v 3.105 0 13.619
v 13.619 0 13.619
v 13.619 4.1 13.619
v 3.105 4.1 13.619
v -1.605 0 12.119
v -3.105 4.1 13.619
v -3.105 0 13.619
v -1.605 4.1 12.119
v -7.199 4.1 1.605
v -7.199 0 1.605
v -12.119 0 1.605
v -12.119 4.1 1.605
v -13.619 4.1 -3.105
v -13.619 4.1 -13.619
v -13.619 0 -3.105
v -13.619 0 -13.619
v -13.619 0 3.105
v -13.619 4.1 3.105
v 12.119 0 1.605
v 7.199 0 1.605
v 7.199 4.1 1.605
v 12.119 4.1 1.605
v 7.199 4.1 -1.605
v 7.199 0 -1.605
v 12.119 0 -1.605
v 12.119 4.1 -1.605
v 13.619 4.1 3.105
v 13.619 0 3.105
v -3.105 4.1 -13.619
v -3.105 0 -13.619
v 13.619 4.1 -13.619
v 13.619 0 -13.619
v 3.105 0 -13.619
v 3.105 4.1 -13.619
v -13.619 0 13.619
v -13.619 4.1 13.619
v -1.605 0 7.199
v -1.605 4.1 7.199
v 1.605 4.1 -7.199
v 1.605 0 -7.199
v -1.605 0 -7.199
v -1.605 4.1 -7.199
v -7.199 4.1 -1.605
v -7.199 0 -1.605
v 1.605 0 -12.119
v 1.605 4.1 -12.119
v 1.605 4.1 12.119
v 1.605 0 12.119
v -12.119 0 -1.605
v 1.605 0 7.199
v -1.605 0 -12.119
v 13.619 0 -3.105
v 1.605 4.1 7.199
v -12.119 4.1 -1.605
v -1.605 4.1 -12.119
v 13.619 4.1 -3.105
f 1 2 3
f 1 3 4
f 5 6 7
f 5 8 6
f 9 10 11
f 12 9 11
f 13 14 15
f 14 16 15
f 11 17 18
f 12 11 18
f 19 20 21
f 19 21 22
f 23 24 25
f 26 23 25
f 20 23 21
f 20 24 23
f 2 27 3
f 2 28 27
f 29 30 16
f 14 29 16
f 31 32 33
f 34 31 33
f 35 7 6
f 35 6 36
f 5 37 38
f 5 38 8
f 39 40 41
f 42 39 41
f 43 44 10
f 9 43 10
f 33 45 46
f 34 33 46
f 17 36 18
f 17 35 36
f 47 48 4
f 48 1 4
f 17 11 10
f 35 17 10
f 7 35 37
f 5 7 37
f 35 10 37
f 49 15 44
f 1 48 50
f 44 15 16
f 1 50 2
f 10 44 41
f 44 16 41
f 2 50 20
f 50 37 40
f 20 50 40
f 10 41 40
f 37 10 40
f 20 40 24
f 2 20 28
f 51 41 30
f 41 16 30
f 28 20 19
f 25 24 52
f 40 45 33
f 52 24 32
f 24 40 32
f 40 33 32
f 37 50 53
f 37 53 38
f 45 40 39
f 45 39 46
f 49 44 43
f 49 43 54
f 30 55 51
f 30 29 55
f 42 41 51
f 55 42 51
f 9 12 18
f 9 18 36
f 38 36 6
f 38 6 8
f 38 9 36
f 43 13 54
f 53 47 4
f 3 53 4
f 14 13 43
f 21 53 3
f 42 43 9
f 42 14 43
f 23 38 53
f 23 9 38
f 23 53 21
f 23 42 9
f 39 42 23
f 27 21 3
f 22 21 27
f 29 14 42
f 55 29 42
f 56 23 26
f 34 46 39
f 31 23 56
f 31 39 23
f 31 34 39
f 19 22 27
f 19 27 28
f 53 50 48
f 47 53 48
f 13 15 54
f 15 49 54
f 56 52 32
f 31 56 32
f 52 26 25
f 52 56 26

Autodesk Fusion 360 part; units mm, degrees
sketch "Sketch1" plane through (0, 0, 0) normal (0, 1, 0) x (1, 0, 0)
  line L0 (13.6189, 1.605) -> (13.6189, 13.6189)
  line L1 (-13.6189, 13.6189) -> (-13.6189, 1.605)
  line L2 (13.6189, -1.605) -> (13.6189, -13.6189)
  line L3 (-13.6189, -13.6189) -> (-13.6189, -1.605)
  line L4 (1.605, 7.1989) -> (1.605, 13.6189)
  line L5 (0, 0) -> (2.5, 0)
  line L6 (7.1989, 1.605) -> (13.6189, 1.605)
  line L7 (7.1989, -1.605) -> (13.6189, -1.605)
  line L8 (13.6189, 13.6189) -> (1.605, 13.6189)
  line L9 (-1.605, 13.6189) -> (-13.6189, 13.6189)
  line L10 (-13.6189, 13.6189) -> (0, 0)
  line L11 (0, 0) -> (13.6189, 13.6189)
  line L12 (-13.6189, -13.6189) -> (0, 0)
  line L13 (0, 0) -> (13.6189, -13.6189)
  line L14 (7.1989, 1.605) -> (7.1989, -1.605)
  line L15 (-7.1989, -1.605) -> (-13.6189, -1.605)
  line L16 (-7.1989, 1.605) -> (-7.1989, -1.605)
  line L17 (-7.1989, 1.605) -> (-13.6189, 1.605)
  line L18 (-1.605, 7.1989) -> (-1.605, 13.6189)
  line L19 (1.605, 7.1989) -> (-1.605, 7.1989)
  line L20 (-1.605, -7.1989) -> (-1.605, -13.6189)
  line L21 (1.605, -7.1989) -> (1.605, -13.6189)
  line L22 (1.605, -7.1989) -> (-1.605, -7.1989)
  line L23 (13.6189, -13.6189) -> (1.605, -13.6189)
  line L24 (-1.605, -13.6189) -> (-13.6189, -13.6189)
  line L25 (81.6508, 319732.5239) -> (6.33, 319732.5239)
  line L26 (81.6508, 319732.5239) -> (102.864, 319753.7371)
  line L27 (92.864, 319735.0239) -> (102.864, 319735.0239)
  line L28 (102.864, 319753.7371) -> (84.1508, 319753.7371)
  line L29 (92.864, 319730.0239) -> (102.864, 319730.0239)
  line L30 (102.864, 319735.0239) -> (102.864, 319753.7371)
  line L31 (60.4376, 319753.7371) -> (60.4376, 319735.0239)
  line L32 (60.4376, 319711.3107) -> (60.4376, 319730.0239)
  line L33 (84.1508, 319743.7371) -> (84.1508, 319753.7371)
  line L34 (60.4376, 319711.3107) -> (81.6508, 319732.5239)
  line L35 (102.864, 319730.0239) -> (102.864, 319711.3107)
  line L36 (60.4376, 319753.7371) -> (81.6508, 319732.5239)
  line L37 (84.1508, 319721.3107) -> (79.1508, 319721.3107)
  line L38 (84.1508, 319721.3107) -> (84.1508, 319711.3107)
  line L39 (79.1508, 319721.3107) -> (79.1508, 319711.3107)
  line L40 (84.1508, 319743.7371) -> (79.1508, 319743.7371)
  line L41 (79.1508, 319743.7371) -> (79.1508, 319753.7371)
  line L42 (92.864, 319735.0239) -> (92.864, 319730.0239)
  line L43 (81.6508, 319732.5239) -> (102.864, 319711.3107)
  line L44 (79.1508, 319753.7371) -> (60.4376, 319753.7371)
  line L45 (79.1508, 319711.3107) -> (60.4376, 319711.3107)
  line L46 (70.4376, 319730.0239) -> (60.4376, 319730.0239)
  line L47 (70.4376, 319735.0239) -> (70.4376, 319730.0239)
  line L48 (70.4376, 319735.0239) -> (60.4376, 319735.0239)
  line L49 (102.864, 319711.3107) -> (84.1508, 319711.3107)
  dimension "d9" = 19.26
  dimension "d15" = 6.42
  dimension "d60" = 30
  dimension "d61" = 10
  dimension "d62" = 5
  dimension "d69" = 3.21
extrude "Extrude1" add sketch "Sketch1" along normal blind 4.1 contours L0 L2 L6 L7 L11 L13 L14 | L4 L8 L9 L10 L11 L18 L19 | L1 L3 L10 L12 L15 L16 L17 | L12 L13 L20 L21 L22 L23 L24
chamfer "Chamfer1" distance 1.5 angle 45 8 edges at (-13.6189, 2.05, 1.605) (-13.6189, 2.05, -1.605) (-1.605, 2.05, -13.6189) (1.605, 2.05, -13.6189) (13.6189, 2.05, -1.605) (13.6189, 2.05, 1.605) (1.605, 2.05, 13.6189) (-1.605, 2.05, 13.6189) measured on face at (-9.3389, 1.3667, 1.605) measured on face at (-13.6189, 1.3667, -9.6143) measured on face at (-1.605, 2.7333, -11.4789) measured on face at (9.6143, 1.3667, -13.6189) measured on face at (9.3389, 1.3667, -1.605) measured on face at (13.6189, 1.3667, 5.6096) measured on face at (1.605, 1.3667, 9.3389) measured on face at (-5.6096, 1.3667, 13.6189)
equation "d9 = THICKNESS * 6"
equation "d15 = THICKNESS * 2"
equation "SLOT = 10 mm"
equation "d60 = SLOT * 3"
equation "d61 = SLOT"
equation "d62 = SLOT / 2"
equation "d69 = THICKNESS"
equation "THICKNESS = 3.21 mm"
